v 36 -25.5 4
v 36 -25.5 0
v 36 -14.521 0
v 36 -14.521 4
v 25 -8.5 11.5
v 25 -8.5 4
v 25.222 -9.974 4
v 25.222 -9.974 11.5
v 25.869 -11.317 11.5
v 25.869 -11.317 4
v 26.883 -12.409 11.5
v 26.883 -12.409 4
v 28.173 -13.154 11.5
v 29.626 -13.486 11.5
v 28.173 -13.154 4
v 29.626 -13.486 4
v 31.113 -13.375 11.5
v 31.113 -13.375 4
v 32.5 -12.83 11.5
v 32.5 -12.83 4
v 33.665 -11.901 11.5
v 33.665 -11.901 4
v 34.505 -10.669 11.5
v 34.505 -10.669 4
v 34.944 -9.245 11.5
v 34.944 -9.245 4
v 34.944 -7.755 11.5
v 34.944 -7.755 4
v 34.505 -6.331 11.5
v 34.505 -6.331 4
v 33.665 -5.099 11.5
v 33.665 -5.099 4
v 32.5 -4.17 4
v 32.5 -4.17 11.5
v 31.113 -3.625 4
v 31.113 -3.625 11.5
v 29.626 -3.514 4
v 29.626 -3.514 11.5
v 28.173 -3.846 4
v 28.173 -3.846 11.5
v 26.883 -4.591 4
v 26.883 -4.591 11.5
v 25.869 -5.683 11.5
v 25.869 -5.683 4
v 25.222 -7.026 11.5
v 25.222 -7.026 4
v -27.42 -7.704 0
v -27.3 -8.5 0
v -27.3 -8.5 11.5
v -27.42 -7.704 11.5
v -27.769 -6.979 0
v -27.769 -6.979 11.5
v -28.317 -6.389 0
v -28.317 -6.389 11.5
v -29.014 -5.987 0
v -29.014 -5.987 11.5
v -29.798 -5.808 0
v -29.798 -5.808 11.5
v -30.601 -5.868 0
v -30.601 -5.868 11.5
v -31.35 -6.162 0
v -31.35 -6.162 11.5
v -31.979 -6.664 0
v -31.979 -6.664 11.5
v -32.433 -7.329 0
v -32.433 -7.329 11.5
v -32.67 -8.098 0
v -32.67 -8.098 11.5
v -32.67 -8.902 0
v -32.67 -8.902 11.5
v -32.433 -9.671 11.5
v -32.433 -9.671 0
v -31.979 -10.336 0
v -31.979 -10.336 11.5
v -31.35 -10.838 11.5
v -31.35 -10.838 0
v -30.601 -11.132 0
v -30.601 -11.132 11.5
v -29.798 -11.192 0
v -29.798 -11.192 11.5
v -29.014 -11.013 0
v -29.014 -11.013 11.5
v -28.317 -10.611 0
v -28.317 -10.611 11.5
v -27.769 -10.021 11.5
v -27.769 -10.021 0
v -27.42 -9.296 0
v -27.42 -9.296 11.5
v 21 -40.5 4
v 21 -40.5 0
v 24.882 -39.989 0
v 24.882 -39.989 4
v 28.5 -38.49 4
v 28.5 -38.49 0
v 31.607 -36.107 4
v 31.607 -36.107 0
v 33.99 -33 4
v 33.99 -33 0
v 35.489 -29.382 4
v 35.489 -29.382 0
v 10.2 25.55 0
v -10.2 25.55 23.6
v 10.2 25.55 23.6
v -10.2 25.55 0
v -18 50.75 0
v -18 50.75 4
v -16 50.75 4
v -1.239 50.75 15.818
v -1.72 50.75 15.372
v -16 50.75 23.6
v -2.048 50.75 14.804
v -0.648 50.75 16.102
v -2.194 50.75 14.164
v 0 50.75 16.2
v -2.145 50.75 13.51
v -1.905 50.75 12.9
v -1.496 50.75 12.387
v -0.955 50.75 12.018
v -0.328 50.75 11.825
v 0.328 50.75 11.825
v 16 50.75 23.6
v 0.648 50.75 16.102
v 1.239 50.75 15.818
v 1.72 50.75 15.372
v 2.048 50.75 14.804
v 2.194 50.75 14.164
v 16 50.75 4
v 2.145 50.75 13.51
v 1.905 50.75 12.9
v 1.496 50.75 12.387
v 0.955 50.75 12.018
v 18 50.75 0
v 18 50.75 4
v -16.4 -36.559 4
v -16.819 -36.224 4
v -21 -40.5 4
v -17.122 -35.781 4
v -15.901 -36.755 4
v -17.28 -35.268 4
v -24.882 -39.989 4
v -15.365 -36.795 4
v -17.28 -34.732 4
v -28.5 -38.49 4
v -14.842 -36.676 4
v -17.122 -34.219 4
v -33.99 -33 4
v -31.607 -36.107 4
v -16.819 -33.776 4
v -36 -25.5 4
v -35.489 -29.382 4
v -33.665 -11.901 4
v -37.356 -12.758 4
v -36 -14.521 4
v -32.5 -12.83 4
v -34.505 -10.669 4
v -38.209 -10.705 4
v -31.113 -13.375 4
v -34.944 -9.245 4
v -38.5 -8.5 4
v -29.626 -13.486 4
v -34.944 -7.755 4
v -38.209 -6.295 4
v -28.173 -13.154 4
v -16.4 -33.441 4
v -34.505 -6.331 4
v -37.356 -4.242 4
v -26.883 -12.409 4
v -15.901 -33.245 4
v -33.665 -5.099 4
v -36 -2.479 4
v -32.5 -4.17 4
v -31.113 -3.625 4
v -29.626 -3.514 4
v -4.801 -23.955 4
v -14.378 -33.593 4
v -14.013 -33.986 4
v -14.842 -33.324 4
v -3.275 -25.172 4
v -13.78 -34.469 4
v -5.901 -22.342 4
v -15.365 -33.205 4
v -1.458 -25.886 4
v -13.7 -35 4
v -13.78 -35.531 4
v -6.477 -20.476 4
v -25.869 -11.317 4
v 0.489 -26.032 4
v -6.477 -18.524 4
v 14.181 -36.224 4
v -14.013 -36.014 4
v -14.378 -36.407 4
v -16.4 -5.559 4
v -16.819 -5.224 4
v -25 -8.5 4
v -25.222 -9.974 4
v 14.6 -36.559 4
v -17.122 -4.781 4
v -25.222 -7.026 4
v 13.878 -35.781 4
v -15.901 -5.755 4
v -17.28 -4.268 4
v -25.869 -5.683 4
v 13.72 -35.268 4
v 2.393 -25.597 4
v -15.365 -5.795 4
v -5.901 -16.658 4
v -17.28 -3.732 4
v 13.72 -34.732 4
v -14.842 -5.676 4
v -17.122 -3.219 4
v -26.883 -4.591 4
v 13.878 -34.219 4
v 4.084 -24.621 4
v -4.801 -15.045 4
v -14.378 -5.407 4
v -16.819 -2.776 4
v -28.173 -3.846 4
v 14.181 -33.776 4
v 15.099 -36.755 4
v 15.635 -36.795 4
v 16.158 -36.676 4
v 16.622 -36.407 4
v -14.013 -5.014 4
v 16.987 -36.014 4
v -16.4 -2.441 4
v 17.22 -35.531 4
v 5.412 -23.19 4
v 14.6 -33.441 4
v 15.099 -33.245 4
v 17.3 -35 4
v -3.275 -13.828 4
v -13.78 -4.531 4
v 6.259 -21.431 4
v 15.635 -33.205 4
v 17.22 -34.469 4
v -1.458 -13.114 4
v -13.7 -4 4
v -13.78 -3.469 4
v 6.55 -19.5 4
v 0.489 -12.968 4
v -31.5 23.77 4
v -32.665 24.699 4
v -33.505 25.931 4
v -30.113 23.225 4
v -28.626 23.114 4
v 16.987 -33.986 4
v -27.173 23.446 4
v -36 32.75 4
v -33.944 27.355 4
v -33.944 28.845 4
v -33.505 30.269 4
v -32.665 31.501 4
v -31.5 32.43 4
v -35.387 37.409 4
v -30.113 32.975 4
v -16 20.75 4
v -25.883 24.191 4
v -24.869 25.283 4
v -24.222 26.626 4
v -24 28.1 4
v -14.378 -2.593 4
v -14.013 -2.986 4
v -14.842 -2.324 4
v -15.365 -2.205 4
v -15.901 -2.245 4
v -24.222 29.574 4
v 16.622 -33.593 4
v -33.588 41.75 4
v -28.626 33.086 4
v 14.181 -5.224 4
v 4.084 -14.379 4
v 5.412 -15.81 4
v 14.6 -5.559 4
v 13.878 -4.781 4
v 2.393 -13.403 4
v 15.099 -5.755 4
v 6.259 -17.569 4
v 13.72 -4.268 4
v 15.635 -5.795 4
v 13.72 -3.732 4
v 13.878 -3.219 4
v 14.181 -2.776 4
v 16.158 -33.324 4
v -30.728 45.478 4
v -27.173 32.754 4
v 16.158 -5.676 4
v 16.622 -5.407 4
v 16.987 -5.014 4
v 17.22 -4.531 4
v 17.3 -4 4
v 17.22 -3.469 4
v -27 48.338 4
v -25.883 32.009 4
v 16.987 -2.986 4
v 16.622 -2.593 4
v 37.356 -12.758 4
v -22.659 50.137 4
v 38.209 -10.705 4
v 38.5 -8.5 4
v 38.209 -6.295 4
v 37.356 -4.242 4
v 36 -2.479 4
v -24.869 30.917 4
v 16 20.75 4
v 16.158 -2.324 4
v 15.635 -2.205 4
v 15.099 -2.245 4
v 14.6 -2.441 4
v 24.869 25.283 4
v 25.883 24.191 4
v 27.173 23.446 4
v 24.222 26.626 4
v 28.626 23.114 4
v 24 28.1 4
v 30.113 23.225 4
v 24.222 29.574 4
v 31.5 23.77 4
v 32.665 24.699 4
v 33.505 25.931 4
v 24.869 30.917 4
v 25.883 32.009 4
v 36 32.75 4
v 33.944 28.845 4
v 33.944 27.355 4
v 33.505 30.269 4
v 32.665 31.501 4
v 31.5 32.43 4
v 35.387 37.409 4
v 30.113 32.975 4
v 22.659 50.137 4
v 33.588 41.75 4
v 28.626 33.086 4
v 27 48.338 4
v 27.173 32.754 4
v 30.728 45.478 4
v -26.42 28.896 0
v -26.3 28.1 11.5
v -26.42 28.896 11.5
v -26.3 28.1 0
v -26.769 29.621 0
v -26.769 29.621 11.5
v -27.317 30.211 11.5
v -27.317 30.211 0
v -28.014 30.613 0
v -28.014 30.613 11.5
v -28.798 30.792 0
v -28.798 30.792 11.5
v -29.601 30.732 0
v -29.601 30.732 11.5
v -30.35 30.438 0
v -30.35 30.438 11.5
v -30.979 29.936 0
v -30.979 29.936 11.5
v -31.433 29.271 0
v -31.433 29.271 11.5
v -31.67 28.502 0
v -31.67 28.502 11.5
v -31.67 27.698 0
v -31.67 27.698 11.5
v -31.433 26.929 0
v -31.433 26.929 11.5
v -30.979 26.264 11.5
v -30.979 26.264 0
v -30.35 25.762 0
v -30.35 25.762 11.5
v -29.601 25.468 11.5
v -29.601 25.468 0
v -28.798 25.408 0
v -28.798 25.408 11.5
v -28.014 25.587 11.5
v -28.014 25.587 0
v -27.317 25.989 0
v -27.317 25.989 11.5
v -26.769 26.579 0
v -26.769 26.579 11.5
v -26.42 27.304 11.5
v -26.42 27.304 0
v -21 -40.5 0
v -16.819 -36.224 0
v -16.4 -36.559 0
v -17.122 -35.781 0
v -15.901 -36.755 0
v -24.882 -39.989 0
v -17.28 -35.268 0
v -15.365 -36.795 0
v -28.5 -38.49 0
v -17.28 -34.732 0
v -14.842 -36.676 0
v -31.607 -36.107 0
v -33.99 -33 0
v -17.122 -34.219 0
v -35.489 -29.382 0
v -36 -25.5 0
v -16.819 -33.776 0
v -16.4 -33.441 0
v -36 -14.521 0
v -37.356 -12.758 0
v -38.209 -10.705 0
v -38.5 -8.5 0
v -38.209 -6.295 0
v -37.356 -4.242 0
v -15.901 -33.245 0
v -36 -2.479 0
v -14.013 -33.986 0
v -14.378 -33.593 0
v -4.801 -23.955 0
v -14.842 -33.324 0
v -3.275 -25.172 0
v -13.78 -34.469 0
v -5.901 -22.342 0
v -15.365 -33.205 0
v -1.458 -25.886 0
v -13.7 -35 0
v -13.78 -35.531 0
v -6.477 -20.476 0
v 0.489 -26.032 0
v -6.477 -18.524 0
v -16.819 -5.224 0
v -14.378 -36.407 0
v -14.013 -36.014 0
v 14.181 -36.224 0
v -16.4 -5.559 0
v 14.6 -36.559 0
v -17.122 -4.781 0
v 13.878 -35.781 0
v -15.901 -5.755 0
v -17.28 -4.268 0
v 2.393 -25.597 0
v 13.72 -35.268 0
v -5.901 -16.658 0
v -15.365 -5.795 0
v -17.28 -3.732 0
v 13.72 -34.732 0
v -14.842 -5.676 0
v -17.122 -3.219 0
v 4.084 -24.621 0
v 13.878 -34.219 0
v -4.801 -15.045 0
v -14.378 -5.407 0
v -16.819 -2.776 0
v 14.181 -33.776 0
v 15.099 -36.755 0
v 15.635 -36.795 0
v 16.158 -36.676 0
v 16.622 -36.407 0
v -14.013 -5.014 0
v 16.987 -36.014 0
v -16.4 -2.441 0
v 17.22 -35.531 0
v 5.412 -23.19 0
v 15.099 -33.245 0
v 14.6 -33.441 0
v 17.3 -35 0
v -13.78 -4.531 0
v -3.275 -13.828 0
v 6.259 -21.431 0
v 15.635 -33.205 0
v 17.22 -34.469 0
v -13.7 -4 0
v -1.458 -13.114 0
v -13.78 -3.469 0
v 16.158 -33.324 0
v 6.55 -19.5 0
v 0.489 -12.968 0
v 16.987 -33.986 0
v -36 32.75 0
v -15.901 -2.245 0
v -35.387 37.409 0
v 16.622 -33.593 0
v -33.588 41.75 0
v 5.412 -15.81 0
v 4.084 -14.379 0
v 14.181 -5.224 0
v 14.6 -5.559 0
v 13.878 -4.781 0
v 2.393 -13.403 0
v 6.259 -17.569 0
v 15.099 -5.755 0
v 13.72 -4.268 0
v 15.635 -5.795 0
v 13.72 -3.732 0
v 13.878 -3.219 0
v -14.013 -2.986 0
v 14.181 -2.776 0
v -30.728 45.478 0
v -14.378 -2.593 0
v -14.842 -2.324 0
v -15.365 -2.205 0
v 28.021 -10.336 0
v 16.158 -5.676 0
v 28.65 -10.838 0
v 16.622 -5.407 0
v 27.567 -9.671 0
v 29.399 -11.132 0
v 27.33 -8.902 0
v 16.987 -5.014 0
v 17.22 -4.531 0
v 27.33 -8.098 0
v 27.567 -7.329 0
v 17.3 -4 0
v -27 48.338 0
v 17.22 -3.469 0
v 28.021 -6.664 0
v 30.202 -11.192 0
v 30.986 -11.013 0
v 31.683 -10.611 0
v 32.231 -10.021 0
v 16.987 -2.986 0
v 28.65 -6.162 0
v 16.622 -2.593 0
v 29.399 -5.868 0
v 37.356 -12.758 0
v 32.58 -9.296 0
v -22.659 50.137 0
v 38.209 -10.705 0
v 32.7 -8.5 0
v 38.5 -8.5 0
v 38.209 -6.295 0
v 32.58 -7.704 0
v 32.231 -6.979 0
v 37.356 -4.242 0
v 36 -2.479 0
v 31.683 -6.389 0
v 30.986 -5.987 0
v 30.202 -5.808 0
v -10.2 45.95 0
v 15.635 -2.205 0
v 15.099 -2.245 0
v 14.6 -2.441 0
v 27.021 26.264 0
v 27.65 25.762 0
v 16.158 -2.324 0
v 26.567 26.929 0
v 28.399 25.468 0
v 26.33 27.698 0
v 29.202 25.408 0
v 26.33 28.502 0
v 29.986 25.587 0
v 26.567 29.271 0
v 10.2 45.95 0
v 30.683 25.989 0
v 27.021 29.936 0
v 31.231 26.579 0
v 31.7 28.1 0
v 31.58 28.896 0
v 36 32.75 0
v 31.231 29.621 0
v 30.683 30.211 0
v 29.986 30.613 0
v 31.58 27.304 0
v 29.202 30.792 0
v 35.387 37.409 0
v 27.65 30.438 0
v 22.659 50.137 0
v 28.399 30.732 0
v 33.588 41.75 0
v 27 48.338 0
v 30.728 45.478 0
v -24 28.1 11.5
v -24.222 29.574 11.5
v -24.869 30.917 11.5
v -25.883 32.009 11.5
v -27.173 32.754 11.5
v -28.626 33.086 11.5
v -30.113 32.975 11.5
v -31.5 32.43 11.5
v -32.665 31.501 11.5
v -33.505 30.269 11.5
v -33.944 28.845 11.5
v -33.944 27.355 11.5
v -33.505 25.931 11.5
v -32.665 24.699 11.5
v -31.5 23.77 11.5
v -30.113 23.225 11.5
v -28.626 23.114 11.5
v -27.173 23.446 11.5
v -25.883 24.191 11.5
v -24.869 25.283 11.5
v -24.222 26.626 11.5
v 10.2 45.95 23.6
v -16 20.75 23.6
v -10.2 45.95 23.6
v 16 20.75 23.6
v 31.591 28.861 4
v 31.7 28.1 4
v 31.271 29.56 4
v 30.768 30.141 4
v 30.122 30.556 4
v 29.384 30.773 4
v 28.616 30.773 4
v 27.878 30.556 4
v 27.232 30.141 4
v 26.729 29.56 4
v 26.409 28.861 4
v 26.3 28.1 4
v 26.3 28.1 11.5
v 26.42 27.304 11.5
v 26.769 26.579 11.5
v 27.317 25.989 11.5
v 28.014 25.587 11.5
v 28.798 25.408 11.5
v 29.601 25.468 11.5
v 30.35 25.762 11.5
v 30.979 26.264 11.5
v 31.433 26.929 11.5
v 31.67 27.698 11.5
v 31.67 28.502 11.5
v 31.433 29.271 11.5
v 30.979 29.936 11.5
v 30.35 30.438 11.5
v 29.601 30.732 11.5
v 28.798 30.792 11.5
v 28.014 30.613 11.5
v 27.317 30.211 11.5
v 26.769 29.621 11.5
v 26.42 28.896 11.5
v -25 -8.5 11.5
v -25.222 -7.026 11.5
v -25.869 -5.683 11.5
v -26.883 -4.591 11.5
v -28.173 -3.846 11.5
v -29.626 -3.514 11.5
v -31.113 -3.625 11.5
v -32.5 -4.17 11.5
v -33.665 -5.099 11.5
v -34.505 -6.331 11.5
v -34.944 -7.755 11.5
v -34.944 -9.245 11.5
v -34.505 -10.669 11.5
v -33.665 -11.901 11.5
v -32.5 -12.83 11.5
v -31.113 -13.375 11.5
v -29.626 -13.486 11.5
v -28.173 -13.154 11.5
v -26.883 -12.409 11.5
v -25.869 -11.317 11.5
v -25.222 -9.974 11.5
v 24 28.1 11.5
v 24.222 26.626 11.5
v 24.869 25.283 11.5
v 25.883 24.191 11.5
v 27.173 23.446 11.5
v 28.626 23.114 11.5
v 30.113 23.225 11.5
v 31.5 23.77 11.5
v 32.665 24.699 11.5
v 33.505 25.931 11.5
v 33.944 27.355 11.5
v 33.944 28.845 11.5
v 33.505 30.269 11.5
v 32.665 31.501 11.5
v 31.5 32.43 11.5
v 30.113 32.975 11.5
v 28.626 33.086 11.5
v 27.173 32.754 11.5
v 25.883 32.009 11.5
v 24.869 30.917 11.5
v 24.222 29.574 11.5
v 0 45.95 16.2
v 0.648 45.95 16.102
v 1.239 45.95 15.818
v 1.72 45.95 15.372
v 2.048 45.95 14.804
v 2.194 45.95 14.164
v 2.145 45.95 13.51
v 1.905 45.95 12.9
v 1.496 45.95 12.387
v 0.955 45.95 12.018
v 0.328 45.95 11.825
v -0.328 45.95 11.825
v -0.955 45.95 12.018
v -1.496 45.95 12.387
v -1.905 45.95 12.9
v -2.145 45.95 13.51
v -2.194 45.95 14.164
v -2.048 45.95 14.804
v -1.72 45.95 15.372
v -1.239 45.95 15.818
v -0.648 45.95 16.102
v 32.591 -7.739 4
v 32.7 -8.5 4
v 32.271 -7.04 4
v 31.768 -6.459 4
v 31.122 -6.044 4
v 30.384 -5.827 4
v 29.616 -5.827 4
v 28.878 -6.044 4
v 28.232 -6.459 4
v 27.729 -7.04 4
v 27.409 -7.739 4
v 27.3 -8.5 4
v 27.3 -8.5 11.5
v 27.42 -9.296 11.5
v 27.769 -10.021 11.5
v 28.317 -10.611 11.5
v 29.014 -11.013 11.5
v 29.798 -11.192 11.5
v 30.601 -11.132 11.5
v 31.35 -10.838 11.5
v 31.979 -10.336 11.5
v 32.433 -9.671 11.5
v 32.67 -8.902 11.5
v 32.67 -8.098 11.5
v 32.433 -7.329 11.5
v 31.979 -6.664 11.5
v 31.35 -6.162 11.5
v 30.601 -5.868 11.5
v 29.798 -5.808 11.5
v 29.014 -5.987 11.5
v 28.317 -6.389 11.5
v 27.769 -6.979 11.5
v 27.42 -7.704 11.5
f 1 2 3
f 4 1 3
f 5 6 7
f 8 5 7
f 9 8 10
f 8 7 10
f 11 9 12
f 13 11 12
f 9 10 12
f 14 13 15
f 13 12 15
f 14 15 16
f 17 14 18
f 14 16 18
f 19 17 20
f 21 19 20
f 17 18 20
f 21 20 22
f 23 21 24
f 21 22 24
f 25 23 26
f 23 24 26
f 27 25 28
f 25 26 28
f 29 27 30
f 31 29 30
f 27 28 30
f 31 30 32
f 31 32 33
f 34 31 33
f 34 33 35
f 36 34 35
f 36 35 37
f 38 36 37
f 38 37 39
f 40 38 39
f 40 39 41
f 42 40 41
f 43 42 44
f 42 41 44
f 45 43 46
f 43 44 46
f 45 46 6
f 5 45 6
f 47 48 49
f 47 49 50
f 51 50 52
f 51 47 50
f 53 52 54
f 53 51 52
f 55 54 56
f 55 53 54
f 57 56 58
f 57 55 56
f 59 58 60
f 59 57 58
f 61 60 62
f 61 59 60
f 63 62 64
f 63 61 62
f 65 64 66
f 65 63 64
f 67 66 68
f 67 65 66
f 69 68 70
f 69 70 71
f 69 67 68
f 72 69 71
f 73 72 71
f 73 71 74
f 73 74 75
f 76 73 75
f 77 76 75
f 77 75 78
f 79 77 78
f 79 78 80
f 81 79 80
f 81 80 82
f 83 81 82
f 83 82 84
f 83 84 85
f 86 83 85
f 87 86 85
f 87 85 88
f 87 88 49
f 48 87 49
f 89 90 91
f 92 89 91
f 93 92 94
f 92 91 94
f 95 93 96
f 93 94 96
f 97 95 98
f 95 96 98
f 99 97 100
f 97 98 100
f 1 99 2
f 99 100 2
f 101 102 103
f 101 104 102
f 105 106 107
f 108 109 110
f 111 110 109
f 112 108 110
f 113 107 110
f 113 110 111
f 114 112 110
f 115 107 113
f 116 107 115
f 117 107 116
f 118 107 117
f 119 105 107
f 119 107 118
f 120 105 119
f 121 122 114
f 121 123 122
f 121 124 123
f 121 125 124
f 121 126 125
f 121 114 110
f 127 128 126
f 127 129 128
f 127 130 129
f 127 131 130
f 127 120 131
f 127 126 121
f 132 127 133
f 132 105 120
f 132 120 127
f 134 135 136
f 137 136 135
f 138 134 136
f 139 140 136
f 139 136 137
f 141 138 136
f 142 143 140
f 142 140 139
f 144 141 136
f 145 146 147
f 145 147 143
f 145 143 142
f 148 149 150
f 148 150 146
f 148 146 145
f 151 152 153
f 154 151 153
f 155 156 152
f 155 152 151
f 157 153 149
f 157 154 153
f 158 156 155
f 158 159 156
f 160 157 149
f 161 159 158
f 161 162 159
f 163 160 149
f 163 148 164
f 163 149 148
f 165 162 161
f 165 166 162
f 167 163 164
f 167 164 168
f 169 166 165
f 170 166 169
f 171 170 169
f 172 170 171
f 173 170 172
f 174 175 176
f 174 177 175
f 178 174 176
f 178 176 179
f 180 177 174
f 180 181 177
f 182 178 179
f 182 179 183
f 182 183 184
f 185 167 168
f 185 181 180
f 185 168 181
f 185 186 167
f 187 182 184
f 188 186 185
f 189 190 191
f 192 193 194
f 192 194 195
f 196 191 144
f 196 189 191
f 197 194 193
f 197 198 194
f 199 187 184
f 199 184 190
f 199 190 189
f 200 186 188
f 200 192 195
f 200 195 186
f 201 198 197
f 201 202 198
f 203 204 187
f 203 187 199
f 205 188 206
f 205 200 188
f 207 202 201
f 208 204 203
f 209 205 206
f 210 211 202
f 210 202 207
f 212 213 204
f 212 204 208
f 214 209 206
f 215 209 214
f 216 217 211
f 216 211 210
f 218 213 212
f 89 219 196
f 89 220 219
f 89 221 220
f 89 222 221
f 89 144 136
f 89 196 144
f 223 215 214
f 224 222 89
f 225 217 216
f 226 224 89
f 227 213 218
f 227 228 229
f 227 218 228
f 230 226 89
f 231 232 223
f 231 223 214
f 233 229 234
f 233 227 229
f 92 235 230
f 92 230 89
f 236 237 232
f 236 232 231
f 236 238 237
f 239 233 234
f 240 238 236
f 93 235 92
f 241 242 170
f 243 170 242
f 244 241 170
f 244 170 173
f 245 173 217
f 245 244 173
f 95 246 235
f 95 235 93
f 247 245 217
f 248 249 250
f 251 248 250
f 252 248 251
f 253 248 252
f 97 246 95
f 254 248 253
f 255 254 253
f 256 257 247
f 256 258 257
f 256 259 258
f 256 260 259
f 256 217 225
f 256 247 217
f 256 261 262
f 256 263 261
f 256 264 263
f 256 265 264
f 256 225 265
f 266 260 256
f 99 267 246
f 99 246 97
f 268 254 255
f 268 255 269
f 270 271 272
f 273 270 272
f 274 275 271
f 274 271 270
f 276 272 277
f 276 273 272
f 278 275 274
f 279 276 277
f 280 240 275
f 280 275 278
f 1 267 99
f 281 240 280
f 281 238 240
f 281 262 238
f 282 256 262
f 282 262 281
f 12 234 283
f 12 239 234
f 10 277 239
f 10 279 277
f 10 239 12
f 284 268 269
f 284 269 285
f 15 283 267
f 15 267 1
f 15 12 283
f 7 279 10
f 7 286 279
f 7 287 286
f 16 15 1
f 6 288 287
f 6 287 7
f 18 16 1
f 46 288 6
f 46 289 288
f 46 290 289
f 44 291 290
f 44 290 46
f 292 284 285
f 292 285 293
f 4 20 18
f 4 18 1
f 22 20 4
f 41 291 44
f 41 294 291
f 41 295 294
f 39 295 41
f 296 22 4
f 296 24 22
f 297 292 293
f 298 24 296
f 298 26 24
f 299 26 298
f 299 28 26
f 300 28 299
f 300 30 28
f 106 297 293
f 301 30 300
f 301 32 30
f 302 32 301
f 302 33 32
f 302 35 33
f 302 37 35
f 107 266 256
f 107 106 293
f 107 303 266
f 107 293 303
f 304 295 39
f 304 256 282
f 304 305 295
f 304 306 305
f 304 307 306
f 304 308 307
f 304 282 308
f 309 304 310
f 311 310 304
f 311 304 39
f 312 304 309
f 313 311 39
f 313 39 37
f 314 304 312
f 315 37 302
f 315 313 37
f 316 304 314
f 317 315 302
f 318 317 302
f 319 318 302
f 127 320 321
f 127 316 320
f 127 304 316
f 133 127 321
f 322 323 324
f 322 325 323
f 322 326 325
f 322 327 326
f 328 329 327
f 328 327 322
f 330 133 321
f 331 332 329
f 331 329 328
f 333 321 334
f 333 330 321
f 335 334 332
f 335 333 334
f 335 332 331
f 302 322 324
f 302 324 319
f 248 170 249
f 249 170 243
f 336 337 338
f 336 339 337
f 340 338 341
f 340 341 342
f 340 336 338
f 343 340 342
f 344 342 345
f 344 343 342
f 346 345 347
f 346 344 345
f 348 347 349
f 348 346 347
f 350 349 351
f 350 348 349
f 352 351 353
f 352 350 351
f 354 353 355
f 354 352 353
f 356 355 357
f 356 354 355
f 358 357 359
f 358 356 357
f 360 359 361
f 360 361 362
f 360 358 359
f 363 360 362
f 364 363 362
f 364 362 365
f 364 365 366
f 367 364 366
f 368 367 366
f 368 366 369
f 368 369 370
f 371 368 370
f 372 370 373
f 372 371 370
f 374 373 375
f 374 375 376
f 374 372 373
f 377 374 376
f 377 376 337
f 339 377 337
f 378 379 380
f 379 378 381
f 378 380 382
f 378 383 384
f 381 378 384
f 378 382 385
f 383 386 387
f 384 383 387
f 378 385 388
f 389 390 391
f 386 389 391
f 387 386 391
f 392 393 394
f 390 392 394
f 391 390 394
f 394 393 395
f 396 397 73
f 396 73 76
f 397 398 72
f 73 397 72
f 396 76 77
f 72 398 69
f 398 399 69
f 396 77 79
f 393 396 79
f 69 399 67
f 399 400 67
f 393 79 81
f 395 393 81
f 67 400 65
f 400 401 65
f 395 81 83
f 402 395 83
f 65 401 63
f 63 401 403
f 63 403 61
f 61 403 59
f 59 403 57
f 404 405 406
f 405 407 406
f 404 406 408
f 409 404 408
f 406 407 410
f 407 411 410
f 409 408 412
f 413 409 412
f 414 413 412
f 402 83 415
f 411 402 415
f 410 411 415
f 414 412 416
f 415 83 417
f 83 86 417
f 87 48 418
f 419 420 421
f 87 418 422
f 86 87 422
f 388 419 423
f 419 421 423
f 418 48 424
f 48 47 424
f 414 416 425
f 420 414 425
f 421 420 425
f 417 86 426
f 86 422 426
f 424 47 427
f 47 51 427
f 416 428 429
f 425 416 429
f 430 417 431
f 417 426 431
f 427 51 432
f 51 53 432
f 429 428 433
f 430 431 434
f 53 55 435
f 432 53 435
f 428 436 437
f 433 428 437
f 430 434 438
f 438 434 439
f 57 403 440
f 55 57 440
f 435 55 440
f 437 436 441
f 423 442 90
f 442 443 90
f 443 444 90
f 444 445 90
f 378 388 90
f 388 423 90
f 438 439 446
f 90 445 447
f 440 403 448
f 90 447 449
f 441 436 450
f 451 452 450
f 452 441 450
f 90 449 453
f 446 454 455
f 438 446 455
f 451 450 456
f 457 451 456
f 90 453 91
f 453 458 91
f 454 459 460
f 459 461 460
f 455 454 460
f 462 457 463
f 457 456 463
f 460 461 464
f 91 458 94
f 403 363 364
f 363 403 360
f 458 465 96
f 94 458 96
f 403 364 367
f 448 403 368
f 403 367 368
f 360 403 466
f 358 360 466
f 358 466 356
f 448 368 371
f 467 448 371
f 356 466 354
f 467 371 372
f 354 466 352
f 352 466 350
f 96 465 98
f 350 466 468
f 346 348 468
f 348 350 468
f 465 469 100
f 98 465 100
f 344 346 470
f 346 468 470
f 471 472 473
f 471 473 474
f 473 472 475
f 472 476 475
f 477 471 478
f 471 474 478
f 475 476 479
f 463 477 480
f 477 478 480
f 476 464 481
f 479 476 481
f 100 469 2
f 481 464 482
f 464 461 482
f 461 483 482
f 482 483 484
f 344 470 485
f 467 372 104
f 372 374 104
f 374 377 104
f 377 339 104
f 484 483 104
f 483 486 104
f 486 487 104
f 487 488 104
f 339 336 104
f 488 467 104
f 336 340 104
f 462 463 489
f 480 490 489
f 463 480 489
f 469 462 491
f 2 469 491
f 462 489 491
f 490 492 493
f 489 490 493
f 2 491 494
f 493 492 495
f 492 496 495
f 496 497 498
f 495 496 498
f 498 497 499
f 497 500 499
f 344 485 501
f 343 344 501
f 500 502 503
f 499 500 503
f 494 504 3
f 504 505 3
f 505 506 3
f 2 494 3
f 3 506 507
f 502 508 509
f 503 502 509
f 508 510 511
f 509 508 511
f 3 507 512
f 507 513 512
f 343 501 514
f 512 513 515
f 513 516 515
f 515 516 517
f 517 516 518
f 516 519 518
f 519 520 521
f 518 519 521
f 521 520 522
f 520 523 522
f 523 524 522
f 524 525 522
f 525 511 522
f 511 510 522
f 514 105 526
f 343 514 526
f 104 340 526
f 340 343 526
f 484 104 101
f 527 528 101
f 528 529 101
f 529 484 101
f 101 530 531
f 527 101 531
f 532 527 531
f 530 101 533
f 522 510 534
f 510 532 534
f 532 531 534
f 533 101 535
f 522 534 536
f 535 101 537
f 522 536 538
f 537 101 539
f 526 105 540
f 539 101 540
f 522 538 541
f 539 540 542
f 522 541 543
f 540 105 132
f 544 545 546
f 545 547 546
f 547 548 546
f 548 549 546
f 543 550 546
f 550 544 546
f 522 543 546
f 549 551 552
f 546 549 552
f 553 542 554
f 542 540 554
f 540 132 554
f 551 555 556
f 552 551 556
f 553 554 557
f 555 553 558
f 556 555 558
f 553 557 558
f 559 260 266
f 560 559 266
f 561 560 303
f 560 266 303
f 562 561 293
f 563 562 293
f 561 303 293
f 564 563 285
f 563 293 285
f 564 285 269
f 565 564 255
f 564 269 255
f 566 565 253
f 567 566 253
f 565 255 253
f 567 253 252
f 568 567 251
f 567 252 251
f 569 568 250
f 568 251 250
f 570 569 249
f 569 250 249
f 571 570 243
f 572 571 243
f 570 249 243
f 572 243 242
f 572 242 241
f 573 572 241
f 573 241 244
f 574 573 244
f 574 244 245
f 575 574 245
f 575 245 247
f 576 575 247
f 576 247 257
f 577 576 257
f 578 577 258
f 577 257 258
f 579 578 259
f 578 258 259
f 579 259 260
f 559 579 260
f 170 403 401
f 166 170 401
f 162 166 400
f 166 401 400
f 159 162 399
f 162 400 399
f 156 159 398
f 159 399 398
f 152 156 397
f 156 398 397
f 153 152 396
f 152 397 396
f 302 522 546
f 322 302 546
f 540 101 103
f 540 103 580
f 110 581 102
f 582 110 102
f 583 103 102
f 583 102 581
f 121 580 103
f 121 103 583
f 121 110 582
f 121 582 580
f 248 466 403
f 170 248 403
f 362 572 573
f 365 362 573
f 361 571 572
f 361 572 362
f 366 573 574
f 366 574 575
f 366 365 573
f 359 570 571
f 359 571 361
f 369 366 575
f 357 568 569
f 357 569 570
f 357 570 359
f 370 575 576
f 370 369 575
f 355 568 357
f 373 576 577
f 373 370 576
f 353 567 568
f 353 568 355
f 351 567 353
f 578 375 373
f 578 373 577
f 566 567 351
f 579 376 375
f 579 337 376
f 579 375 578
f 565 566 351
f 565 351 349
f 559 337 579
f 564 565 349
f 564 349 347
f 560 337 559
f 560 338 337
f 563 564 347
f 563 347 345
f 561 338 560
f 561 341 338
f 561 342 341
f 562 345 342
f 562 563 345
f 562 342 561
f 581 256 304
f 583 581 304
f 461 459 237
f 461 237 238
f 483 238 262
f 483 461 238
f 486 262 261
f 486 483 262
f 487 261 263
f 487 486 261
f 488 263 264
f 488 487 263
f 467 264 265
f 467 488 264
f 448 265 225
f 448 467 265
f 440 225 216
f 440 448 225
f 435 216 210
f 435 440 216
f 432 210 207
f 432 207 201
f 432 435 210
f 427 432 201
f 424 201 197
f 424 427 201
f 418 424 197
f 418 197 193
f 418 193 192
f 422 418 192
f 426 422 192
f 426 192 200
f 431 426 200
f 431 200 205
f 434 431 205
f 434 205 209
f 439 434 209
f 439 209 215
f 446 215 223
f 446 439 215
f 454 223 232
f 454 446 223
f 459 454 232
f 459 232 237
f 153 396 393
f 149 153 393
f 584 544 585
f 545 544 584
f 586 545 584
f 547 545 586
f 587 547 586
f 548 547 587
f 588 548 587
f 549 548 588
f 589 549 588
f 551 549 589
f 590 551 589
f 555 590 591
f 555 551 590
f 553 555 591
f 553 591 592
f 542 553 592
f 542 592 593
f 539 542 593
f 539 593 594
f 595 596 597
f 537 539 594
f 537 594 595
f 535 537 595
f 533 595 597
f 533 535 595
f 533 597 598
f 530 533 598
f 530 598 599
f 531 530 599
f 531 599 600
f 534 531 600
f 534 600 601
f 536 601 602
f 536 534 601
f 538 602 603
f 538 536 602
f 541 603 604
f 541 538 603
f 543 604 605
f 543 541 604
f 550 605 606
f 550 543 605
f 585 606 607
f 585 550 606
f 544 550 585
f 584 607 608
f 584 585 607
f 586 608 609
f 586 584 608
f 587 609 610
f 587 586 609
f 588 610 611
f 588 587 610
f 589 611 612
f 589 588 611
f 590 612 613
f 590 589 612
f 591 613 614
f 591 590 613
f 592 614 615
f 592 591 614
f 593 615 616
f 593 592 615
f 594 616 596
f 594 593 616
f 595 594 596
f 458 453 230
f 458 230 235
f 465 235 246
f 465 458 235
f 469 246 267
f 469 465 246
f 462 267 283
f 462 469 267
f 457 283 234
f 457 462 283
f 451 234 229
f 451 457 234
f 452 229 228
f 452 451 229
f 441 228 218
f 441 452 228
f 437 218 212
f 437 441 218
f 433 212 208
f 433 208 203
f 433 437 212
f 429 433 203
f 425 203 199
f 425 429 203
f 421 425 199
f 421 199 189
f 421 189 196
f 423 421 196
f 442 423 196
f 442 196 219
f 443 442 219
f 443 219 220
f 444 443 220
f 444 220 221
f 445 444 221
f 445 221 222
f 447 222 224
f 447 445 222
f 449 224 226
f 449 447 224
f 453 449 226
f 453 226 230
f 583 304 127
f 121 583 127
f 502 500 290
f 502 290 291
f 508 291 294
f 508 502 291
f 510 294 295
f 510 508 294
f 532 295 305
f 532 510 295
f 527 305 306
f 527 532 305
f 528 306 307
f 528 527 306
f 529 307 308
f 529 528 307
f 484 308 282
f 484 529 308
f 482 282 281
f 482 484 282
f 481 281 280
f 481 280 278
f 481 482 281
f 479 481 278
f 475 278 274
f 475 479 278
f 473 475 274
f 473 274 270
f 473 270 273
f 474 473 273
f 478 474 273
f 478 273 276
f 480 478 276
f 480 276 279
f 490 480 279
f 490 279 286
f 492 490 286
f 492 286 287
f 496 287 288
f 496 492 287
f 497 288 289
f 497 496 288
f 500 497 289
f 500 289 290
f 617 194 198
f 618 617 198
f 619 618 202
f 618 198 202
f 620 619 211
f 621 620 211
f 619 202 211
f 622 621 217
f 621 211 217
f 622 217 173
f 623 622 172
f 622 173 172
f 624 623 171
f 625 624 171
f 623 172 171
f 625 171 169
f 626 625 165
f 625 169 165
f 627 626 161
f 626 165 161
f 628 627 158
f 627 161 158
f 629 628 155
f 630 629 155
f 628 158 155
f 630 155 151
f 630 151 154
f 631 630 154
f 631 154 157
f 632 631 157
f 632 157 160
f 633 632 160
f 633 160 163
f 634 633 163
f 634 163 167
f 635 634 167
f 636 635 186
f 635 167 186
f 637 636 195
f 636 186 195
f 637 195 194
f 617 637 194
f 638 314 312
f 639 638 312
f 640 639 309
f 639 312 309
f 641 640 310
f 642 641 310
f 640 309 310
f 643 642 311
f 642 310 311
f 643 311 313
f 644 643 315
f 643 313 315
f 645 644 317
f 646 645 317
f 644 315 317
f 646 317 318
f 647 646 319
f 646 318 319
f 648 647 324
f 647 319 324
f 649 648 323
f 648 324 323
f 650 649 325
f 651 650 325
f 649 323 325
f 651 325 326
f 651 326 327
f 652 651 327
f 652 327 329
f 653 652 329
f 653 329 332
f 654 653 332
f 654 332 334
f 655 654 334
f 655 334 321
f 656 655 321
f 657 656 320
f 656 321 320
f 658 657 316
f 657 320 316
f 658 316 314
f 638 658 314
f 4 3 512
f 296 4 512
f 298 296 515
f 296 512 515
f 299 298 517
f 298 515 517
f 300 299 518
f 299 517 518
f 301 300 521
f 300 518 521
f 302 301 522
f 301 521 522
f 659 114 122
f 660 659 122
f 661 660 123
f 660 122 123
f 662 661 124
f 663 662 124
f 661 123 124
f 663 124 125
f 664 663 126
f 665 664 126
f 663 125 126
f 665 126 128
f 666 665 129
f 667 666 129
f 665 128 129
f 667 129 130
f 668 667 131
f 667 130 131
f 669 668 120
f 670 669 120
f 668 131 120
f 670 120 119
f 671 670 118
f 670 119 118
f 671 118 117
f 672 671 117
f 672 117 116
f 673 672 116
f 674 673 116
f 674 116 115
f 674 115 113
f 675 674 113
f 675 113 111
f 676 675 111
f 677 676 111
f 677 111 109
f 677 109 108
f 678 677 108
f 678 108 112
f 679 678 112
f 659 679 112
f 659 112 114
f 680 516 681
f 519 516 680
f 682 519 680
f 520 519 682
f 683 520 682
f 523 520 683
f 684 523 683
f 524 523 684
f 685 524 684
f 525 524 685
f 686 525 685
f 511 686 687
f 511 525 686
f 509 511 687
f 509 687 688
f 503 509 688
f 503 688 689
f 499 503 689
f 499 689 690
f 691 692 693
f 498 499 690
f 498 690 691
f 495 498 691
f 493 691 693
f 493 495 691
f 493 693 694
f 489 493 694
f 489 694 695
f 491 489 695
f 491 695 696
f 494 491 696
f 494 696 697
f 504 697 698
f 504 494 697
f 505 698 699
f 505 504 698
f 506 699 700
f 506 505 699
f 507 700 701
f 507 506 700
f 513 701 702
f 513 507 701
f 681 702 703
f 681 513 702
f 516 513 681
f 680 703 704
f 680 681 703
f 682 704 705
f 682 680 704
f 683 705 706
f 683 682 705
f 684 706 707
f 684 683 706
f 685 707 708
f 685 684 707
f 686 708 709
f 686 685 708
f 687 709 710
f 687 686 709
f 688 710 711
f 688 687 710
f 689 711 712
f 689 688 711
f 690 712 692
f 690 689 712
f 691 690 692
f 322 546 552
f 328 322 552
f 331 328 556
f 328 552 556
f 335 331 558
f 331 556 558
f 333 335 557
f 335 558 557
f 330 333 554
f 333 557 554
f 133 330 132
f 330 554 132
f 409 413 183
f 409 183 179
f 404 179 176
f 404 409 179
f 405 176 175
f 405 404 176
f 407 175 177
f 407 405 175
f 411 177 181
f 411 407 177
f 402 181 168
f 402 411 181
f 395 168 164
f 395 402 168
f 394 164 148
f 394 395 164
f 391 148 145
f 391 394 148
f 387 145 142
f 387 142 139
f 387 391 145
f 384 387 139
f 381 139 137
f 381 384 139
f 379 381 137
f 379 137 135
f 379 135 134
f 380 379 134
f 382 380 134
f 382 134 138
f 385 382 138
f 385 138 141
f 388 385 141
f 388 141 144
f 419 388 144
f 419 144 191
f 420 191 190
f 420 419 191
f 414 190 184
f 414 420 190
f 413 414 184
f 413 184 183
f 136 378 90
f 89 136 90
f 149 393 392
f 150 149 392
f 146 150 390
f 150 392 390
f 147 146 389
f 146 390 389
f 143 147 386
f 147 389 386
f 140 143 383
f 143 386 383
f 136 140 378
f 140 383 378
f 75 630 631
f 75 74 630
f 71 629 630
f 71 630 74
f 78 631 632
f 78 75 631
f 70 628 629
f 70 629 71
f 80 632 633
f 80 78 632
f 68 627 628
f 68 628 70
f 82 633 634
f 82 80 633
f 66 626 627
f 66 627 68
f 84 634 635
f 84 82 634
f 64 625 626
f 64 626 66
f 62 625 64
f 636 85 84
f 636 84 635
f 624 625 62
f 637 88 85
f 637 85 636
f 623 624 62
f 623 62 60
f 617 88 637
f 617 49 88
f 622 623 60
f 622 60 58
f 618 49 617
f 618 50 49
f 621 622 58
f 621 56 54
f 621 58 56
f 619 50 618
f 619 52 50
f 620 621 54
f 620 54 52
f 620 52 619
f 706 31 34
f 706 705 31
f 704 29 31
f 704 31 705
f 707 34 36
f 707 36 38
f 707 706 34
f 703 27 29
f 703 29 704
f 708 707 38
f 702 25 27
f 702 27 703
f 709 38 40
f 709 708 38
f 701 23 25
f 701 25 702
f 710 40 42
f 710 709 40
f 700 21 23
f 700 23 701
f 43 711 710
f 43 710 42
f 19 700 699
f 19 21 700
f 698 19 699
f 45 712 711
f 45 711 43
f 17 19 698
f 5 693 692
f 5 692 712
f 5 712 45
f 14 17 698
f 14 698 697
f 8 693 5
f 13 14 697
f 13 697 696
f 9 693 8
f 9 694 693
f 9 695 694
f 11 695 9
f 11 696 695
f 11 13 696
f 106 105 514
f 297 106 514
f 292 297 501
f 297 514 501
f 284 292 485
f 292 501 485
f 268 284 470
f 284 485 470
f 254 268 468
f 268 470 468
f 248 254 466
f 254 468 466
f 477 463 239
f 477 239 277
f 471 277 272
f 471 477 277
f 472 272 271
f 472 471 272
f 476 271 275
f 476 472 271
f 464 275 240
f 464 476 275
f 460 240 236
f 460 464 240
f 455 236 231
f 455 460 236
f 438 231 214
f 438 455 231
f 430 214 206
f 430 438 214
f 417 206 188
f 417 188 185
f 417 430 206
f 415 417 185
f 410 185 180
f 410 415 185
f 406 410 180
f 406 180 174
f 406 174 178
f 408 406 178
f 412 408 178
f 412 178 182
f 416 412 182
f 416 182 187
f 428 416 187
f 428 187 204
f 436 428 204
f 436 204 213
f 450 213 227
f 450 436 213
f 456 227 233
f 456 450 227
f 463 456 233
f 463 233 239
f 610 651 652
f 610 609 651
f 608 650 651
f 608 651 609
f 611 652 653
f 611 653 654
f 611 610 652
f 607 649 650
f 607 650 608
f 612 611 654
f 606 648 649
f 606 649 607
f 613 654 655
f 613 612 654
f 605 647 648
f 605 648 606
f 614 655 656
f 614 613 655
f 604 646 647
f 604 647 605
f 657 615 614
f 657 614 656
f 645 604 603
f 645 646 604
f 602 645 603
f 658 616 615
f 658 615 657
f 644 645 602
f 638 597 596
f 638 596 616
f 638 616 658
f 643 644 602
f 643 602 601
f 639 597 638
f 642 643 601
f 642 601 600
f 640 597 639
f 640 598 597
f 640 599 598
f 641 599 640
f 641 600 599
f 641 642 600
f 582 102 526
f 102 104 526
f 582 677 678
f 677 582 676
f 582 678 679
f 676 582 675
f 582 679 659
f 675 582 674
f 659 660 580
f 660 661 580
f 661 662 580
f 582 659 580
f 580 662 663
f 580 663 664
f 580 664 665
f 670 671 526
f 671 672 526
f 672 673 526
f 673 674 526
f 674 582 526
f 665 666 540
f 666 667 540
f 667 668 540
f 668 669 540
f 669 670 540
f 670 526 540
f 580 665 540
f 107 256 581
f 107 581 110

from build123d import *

# Parameters (mm, degrees)
SKETCH_1_R          = 1.8
SKETCH_1_R_2        = 6.55
SKETCH_1_R_3        = 2.7
SKETCH_1_W          = 20.4
SKETCH_1_H          = 20.4
EXTRUDE_1_DEPTH     = 4
EXTRUDE_START       = 4
SKETCH_1_4_W        = 32
SKETCH_1_4_H        = 30
SKETCH_1_4_W_2      = 20.4
SKETCH_1_4_H_2      = 20.4
SKETCH_1_4_R        = 1.6
EXTRUDE_3_DEPTH     = 19.6
CUT_EXTRUDE_4_REACH = 103.812
SKETCH_8_R          = 2.2
SKETCH_9_R          = 5
SKETCH_9_R_2        = 2.7
EXTRUDE_4_DEPTH     = 7.5


with BuildPart() as part:
    # 草图1 → 凸台-拉伸1 (new body)
    with BuildSketch(Plane.XY):
        with BuildLine():
            ThreePointArc((-36, -25.5), (-31.606601718, -36.106601718), (-21, -40.5))
            Line((-21, -40.5), (21, -40.5))
            ThreePointArc((21, -40.5), (31.606601718, -36.106601718), (36, -25.5))
            Line((36, -25.5), (36, -14.520797289))
            ThreePointArc((36, -14.520797289), (38.5, -8.5), (36, -2.479202711))
            Line((36, -2.479202711), (36, 32.75))
            ThreePointArc((36, 32.75), (30.727922061, 45.477922061), (18, 50.75))
            Line((18, 50.75), (-18, 50.75))
            ThreePointArc((-18, 50.75), (-30.727922061, 45.477922061), (-36, 32.75))
            Line((-36, 32.75), (-36, -2.479202711))
            ThreePointArc((-36, -2.479202711), (-38.5, -8.5), (-36, -14.520797289))
            Line((-36, -14.520797289), (-36, -25.5))
        make_face()
        with Locations((15.5, -35)):
            Circle(SKETCH_1_R, mode=Mode.SUBTRACT)
        with Locations((0, -19.5)):
            Circle(SKETCH_1_R_2, mode=Mode.SUBTRACT)
        with Locations((15.5, -4)):
            Circle(SKETCH_1_R, mode=Mode.SUBTRACT)
        with Locations((-15.5, -35)):
            Circle(SKETCH_1_R, mode=Mode.SUBTRACT)
        with Locations((-15.5, -4)):
            Circle(SKETCH_1_R, mode=Mode.SUBTRACT)
        with Locations((-30, -8.5)):
            Circle(SKETCH_1_R_3, mode=Mode.SUBTRACT)
        with Locations((30, -8.5)):
            Circle(SKETCH_1_R_3, mode=Mode.SUBTRACT)
        with Locations((-29, 28.1)):
            Circle(SKETCH_1_R_3, mode=Mode.SUBTRACT)
        with Locations((29, 28.1)):
            Circle(SKETCH_1_R_3, mode=Mode.SUBTRACT)
        with Locations((0, 35.75)):
            Rectangle(SKETCH_1_W, SKETCH_1_H, mode=Mode.SUBTRACT)
    extrude(amount=EXTRUDE_1_DEPTH)

    # 草图1<4> → 凸台-拉伸3 (add)
    # profile 1 of 3: a face of its own
    with BuildSketch(Plane.XY.offset(EXTRUDE_START)):
        with Locations((0, 35.75)):
            Rectangle(SKETCH_1_4_W, SKETCH_1_4_H)
        with Locations((0, 35.75)):
            Rectangle(SKETCH_1_4_W_2, SKETCH_1_4_H_2, mode=Mode.SUBTRACT)
    # profile 2 of 3: a face of its own
    with BuildSketch(Plane.XY.offset(EXTRUDE_START)):
        with Locations((-13.2, 35.75)):
            Circle(SKETCH_1_4_R)
    # profile 3 of 3: a face of its own
    with BuildSketch(Plane.XY.offset(EXTRUDE_START)):
        with Locations((13.2, 35.75)):
            Circle(SKETCH_1_4_R)
    extrude(amount=EXTRUDE_3_DEPTH)

    # 草图8 → 切除-拉伸4 (cut, up to next)
    with BuildSketch(Plane(origin=(0, 50.75, 0), x_dir=(1, 0, 0), z_dir=(0, 1, 0)), mode=Mode.PRIVATE) as cut_extrude_4_sk1:
        with Locations(Location((0, -14, 0), (0, 0, 270))):
            Circle(SKETCH_8_R)
    cut_extrude_4_tool1 = extrude(cut_extrude_4_sk1.sketch, amount=-CUT_EXTRUDE_4_REACH, mode=Mode.PRIVATE) & part.part
    add(cut_extrude_4_tool1.solids().sort_by_distance((0, 50.75, 14))[0], mode=Mode.SUBTRACT)

    # 草图9 → 凸台-拉伸4 (add)
    # profile 1 of 4: a face of its own
    with BuildSketch(Plane.XY.offset(4)):
        with Locations((-29, 28.1)):
            Circle(SKETCH_9_R)
        with Locations((-29, 28.1)):
            Circle(SKETCH_9_R_2, mode=Mode.SUBTRACT)
    # profile 2 of 4: a face of its own
    with BuildSketch(Plane.XY.offset(4)):
        with Locations((-30, -8.5)):
            Circle(SKETCH_9_R)
        with Locations((-30, -8.5)):
            Circle(SKETCH_9_R_2, mode=Mode.SUBTRACT)
    # profile 3 of 4: a face of its own
    with BuildSketch(Plane.XY.offset(4)):
        with Locations(Location((30, -8.5, 0), (0, 0, 180))):
            Circle(SKETCH_9_R)
        with Locations(Location((30, -8.5, 0), (0, 0, 180))):
            Circle(SKETCH_9_R_2, mode=Mode.SUBTRACT)
    # profile 4 of 4: a face of its own
    with BuildSketch(Plane.XY.offset(4)):
        with Locations(Location((29, 28.1, 0), (0, 0, 180))):
            Circle(SKETCH_9_R)
        with Locations(Location((29, 28.1, 0), (0, 0, 180))):
            Circle(SKETCH_9_R_2, mode=Mode.SUBTRACT)
    extrude(amount=EXTRUDE_4_DEPTH)


solid = part.part
